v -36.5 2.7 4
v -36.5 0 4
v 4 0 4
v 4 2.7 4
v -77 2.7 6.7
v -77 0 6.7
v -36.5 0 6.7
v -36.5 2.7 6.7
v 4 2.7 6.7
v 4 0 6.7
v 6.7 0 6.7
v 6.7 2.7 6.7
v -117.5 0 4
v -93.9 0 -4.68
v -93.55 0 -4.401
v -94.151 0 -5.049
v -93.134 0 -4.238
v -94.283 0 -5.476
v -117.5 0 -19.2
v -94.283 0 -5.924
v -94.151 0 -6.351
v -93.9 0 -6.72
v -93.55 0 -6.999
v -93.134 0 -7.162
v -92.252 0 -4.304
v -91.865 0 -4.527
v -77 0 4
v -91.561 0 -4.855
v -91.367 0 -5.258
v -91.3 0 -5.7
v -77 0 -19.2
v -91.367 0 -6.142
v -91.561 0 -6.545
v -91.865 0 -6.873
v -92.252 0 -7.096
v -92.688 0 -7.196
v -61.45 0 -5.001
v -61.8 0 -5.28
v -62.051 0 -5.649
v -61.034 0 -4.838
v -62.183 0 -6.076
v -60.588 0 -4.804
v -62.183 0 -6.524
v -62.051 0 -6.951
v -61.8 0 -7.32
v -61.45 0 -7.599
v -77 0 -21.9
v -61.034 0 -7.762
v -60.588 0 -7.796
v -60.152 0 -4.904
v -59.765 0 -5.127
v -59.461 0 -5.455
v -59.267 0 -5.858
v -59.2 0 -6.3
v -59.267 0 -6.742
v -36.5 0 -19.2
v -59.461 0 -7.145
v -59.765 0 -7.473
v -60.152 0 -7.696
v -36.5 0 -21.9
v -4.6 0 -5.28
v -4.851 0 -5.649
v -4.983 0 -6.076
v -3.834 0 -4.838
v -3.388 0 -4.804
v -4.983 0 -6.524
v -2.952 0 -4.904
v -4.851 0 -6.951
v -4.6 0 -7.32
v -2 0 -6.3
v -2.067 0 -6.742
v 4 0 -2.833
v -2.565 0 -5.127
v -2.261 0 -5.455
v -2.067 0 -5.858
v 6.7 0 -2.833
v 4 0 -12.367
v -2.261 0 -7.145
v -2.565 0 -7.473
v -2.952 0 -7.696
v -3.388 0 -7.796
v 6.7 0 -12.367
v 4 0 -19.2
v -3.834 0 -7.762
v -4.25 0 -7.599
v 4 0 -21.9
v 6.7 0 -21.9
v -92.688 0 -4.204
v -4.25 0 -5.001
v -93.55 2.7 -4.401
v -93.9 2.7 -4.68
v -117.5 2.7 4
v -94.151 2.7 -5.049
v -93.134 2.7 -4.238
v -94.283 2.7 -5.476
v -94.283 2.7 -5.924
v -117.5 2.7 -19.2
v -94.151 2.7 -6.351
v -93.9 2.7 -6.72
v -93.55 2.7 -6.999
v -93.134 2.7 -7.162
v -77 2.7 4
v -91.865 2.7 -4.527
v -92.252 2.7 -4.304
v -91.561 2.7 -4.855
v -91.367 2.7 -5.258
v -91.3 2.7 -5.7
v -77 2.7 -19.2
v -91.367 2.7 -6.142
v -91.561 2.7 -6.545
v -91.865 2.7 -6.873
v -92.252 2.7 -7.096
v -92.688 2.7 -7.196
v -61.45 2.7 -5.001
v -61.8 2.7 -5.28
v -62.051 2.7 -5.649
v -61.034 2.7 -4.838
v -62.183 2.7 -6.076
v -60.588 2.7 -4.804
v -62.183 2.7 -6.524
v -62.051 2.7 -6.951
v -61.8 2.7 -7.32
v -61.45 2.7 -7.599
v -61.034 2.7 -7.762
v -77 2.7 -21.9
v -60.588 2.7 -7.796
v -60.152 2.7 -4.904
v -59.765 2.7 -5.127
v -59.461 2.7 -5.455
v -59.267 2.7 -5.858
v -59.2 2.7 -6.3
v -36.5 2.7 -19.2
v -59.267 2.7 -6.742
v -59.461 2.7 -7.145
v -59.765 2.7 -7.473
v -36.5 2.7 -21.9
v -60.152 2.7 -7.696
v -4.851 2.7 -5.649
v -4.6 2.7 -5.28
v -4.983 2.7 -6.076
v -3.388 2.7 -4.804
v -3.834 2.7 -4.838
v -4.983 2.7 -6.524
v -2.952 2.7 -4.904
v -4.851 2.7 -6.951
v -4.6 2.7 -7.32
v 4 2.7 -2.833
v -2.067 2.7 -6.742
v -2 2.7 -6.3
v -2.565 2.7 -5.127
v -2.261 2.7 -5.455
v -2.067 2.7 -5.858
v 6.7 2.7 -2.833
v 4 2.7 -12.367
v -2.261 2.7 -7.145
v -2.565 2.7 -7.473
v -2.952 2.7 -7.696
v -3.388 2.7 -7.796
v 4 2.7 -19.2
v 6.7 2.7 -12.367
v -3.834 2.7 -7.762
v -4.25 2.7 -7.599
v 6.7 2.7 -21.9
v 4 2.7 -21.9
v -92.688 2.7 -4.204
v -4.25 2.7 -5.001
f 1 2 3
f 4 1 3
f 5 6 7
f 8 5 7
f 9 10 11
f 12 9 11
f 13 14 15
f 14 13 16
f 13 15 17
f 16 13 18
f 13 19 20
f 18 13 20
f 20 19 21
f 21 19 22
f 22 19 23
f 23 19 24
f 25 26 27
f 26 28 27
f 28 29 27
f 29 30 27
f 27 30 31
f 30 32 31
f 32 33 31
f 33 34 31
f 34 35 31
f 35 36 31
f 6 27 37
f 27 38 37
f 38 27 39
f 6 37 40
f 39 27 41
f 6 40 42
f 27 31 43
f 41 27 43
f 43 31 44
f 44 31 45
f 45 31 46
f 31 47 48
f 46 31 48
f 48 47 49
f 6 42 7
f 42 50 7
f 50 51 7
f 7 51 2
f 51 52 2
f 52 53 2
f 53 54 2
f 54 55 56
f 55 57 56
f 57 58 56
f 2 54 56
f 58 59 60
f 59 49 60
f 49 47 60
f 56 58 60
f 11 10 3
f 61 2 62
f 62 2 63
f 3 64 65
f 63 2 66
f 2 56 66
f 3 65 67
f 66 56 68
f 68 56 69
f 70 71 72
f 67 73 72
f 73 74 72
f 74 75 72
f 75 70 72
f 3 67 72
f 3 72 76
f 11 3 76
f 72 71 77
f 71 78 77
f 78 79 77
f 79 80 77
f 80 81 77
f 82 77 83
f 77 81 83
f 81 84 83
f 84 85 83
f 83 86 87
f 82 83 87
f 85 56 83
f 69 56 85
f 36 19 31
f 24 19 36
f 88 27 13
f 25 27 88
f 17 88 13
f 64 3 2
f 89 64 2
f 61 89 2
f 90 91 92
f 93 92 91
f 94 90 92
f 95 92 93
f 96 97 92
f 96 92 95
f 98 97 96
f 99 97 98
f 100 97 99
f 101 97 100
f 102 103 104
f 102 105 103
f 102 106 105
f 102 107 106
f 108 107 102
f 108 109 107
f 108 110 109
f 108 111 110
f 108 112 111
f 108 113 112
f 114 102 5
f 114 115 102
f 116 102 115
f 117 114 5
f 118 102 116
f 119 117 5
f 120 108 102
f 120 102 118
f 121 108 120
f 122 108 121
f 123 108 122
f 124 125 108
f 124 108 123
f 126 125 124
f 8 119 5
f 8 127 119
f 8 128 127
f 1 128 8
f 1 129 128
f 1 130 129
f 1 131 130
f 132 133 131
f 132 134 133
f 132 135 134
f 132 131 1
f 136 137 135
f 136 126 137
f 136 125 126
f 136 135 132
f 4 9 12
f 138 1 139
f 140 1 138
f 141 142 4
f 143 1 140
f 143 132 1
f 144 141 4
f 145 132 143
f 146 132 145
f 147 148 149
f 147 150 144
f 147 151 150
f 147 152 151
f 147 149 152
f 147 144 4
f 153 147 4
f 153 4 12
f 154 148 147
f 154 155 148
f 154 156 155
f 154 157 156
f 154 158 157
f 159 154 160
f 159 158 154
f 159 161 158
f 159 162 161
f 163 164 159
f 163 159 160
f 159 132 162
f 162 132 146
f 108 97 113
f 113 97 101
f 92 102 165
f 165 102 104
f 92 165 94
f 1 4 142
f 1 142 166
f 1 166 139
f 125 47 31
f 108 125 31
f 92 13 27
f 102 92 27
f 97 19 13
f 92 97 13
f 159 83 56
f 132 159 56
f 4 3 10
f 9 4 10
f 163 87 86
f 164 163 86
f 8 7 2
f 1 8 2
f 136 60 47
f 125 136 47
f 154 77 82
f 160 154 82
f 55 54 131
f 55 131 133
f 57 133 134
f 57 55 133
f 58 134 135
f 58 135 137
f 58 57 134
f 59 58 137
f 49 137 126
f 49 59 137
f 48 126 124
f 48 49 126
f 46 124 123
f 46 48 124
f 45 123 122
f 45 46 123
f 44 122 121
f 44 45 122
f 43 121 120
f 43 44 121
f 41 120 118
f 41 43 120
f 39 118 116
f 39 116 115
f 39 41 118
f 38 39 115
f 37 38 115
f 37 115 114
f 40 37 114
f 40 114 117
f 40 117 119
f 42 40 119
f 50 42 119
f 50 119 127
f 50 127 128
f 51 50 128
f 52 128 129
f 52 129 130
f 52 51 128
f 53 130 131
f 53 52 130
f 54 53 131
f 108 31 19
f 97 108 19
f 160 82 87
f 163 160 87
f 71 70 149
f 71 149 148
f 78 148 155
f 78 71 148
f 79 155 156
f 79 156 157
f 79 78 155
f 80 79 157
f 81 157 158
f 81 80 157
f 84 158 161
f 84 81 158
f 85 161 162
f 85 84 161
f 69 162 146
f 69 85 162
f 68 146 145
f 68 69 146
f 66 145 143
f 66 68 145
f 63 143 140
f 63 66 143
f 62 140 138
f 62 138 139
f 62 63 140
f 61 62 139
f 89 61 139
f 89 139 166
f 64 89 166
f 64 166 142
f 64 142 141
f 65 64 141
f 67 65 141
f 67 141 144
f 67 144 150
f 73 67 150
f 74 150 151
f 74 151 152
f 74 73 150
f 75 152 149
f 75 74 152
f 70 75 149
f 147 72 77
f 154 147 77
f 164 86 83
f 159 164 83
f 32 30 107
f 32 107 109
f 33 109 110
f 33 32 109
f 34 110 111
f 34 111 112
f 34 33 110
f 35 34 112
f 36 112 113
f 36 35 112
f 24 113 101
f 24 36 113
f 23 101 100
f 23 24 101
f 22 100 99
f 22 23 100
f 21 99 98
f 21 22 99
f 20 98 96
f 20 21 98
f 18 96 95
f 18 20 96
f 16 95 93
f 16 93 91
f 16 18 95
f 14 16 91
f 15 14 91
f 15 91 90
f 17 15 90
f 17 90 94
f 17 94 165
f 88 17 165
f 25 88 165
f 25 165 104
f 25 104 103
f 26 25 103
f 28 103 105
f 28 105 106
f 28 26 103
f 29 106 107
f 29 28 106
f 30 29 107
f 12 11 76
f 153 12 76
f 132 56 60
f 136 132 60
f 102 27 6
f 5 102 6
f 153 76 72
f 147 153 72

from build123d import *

# Parameters (mm, degrees)
SKETCH1_R           = 1.5
BOSS_EXTRUDE1_DEPTH = 2.7


with BuildPart() as part:
    # Sketch1 → Boss-Extrude1 (new body)
    with BuildSketch(Plane(origin=(0, 0, 0), x_dir=(1, 0, 0), z_dir=(0, 1, 0))):
        Polygon((4, 2.833333333), (4, 12.366666667), (6.7, 12.366666667), (6.7, 21.9), (4, 21.9), (4, 19.2), (-36.5, 19.2), (-36.5, 21.9), (-77, 21.9), (-77, 19.2), (-117.5, 19.2), (-117.5, 12.366666667), (-117.5, 2.833333333), (-117.5, -4), (-77, -4), (-77, -6.7), (-36.5, -6.7), (-36.5, -4), (4, -4), (4, -6.7), (6.7, -6.7), (6.7, 2.833333333), align=None)
        with Locations((-3.5, 6.3)):
            Circle(SKETCH1_R, mode=Mode.SUBTRACT)
        with Locations((-60.7, 6.3)):
            Circle(SKETCH1_R, mode=Mode.SUBTRACT)
        with Locations((-92.8, 5.7)):
            Circle(SKETCH1_R, mode=Mode.SUBTRACT)
    extrude(amount=BOSS_EXTRUDE1_DEPTH)


solid = part.part
